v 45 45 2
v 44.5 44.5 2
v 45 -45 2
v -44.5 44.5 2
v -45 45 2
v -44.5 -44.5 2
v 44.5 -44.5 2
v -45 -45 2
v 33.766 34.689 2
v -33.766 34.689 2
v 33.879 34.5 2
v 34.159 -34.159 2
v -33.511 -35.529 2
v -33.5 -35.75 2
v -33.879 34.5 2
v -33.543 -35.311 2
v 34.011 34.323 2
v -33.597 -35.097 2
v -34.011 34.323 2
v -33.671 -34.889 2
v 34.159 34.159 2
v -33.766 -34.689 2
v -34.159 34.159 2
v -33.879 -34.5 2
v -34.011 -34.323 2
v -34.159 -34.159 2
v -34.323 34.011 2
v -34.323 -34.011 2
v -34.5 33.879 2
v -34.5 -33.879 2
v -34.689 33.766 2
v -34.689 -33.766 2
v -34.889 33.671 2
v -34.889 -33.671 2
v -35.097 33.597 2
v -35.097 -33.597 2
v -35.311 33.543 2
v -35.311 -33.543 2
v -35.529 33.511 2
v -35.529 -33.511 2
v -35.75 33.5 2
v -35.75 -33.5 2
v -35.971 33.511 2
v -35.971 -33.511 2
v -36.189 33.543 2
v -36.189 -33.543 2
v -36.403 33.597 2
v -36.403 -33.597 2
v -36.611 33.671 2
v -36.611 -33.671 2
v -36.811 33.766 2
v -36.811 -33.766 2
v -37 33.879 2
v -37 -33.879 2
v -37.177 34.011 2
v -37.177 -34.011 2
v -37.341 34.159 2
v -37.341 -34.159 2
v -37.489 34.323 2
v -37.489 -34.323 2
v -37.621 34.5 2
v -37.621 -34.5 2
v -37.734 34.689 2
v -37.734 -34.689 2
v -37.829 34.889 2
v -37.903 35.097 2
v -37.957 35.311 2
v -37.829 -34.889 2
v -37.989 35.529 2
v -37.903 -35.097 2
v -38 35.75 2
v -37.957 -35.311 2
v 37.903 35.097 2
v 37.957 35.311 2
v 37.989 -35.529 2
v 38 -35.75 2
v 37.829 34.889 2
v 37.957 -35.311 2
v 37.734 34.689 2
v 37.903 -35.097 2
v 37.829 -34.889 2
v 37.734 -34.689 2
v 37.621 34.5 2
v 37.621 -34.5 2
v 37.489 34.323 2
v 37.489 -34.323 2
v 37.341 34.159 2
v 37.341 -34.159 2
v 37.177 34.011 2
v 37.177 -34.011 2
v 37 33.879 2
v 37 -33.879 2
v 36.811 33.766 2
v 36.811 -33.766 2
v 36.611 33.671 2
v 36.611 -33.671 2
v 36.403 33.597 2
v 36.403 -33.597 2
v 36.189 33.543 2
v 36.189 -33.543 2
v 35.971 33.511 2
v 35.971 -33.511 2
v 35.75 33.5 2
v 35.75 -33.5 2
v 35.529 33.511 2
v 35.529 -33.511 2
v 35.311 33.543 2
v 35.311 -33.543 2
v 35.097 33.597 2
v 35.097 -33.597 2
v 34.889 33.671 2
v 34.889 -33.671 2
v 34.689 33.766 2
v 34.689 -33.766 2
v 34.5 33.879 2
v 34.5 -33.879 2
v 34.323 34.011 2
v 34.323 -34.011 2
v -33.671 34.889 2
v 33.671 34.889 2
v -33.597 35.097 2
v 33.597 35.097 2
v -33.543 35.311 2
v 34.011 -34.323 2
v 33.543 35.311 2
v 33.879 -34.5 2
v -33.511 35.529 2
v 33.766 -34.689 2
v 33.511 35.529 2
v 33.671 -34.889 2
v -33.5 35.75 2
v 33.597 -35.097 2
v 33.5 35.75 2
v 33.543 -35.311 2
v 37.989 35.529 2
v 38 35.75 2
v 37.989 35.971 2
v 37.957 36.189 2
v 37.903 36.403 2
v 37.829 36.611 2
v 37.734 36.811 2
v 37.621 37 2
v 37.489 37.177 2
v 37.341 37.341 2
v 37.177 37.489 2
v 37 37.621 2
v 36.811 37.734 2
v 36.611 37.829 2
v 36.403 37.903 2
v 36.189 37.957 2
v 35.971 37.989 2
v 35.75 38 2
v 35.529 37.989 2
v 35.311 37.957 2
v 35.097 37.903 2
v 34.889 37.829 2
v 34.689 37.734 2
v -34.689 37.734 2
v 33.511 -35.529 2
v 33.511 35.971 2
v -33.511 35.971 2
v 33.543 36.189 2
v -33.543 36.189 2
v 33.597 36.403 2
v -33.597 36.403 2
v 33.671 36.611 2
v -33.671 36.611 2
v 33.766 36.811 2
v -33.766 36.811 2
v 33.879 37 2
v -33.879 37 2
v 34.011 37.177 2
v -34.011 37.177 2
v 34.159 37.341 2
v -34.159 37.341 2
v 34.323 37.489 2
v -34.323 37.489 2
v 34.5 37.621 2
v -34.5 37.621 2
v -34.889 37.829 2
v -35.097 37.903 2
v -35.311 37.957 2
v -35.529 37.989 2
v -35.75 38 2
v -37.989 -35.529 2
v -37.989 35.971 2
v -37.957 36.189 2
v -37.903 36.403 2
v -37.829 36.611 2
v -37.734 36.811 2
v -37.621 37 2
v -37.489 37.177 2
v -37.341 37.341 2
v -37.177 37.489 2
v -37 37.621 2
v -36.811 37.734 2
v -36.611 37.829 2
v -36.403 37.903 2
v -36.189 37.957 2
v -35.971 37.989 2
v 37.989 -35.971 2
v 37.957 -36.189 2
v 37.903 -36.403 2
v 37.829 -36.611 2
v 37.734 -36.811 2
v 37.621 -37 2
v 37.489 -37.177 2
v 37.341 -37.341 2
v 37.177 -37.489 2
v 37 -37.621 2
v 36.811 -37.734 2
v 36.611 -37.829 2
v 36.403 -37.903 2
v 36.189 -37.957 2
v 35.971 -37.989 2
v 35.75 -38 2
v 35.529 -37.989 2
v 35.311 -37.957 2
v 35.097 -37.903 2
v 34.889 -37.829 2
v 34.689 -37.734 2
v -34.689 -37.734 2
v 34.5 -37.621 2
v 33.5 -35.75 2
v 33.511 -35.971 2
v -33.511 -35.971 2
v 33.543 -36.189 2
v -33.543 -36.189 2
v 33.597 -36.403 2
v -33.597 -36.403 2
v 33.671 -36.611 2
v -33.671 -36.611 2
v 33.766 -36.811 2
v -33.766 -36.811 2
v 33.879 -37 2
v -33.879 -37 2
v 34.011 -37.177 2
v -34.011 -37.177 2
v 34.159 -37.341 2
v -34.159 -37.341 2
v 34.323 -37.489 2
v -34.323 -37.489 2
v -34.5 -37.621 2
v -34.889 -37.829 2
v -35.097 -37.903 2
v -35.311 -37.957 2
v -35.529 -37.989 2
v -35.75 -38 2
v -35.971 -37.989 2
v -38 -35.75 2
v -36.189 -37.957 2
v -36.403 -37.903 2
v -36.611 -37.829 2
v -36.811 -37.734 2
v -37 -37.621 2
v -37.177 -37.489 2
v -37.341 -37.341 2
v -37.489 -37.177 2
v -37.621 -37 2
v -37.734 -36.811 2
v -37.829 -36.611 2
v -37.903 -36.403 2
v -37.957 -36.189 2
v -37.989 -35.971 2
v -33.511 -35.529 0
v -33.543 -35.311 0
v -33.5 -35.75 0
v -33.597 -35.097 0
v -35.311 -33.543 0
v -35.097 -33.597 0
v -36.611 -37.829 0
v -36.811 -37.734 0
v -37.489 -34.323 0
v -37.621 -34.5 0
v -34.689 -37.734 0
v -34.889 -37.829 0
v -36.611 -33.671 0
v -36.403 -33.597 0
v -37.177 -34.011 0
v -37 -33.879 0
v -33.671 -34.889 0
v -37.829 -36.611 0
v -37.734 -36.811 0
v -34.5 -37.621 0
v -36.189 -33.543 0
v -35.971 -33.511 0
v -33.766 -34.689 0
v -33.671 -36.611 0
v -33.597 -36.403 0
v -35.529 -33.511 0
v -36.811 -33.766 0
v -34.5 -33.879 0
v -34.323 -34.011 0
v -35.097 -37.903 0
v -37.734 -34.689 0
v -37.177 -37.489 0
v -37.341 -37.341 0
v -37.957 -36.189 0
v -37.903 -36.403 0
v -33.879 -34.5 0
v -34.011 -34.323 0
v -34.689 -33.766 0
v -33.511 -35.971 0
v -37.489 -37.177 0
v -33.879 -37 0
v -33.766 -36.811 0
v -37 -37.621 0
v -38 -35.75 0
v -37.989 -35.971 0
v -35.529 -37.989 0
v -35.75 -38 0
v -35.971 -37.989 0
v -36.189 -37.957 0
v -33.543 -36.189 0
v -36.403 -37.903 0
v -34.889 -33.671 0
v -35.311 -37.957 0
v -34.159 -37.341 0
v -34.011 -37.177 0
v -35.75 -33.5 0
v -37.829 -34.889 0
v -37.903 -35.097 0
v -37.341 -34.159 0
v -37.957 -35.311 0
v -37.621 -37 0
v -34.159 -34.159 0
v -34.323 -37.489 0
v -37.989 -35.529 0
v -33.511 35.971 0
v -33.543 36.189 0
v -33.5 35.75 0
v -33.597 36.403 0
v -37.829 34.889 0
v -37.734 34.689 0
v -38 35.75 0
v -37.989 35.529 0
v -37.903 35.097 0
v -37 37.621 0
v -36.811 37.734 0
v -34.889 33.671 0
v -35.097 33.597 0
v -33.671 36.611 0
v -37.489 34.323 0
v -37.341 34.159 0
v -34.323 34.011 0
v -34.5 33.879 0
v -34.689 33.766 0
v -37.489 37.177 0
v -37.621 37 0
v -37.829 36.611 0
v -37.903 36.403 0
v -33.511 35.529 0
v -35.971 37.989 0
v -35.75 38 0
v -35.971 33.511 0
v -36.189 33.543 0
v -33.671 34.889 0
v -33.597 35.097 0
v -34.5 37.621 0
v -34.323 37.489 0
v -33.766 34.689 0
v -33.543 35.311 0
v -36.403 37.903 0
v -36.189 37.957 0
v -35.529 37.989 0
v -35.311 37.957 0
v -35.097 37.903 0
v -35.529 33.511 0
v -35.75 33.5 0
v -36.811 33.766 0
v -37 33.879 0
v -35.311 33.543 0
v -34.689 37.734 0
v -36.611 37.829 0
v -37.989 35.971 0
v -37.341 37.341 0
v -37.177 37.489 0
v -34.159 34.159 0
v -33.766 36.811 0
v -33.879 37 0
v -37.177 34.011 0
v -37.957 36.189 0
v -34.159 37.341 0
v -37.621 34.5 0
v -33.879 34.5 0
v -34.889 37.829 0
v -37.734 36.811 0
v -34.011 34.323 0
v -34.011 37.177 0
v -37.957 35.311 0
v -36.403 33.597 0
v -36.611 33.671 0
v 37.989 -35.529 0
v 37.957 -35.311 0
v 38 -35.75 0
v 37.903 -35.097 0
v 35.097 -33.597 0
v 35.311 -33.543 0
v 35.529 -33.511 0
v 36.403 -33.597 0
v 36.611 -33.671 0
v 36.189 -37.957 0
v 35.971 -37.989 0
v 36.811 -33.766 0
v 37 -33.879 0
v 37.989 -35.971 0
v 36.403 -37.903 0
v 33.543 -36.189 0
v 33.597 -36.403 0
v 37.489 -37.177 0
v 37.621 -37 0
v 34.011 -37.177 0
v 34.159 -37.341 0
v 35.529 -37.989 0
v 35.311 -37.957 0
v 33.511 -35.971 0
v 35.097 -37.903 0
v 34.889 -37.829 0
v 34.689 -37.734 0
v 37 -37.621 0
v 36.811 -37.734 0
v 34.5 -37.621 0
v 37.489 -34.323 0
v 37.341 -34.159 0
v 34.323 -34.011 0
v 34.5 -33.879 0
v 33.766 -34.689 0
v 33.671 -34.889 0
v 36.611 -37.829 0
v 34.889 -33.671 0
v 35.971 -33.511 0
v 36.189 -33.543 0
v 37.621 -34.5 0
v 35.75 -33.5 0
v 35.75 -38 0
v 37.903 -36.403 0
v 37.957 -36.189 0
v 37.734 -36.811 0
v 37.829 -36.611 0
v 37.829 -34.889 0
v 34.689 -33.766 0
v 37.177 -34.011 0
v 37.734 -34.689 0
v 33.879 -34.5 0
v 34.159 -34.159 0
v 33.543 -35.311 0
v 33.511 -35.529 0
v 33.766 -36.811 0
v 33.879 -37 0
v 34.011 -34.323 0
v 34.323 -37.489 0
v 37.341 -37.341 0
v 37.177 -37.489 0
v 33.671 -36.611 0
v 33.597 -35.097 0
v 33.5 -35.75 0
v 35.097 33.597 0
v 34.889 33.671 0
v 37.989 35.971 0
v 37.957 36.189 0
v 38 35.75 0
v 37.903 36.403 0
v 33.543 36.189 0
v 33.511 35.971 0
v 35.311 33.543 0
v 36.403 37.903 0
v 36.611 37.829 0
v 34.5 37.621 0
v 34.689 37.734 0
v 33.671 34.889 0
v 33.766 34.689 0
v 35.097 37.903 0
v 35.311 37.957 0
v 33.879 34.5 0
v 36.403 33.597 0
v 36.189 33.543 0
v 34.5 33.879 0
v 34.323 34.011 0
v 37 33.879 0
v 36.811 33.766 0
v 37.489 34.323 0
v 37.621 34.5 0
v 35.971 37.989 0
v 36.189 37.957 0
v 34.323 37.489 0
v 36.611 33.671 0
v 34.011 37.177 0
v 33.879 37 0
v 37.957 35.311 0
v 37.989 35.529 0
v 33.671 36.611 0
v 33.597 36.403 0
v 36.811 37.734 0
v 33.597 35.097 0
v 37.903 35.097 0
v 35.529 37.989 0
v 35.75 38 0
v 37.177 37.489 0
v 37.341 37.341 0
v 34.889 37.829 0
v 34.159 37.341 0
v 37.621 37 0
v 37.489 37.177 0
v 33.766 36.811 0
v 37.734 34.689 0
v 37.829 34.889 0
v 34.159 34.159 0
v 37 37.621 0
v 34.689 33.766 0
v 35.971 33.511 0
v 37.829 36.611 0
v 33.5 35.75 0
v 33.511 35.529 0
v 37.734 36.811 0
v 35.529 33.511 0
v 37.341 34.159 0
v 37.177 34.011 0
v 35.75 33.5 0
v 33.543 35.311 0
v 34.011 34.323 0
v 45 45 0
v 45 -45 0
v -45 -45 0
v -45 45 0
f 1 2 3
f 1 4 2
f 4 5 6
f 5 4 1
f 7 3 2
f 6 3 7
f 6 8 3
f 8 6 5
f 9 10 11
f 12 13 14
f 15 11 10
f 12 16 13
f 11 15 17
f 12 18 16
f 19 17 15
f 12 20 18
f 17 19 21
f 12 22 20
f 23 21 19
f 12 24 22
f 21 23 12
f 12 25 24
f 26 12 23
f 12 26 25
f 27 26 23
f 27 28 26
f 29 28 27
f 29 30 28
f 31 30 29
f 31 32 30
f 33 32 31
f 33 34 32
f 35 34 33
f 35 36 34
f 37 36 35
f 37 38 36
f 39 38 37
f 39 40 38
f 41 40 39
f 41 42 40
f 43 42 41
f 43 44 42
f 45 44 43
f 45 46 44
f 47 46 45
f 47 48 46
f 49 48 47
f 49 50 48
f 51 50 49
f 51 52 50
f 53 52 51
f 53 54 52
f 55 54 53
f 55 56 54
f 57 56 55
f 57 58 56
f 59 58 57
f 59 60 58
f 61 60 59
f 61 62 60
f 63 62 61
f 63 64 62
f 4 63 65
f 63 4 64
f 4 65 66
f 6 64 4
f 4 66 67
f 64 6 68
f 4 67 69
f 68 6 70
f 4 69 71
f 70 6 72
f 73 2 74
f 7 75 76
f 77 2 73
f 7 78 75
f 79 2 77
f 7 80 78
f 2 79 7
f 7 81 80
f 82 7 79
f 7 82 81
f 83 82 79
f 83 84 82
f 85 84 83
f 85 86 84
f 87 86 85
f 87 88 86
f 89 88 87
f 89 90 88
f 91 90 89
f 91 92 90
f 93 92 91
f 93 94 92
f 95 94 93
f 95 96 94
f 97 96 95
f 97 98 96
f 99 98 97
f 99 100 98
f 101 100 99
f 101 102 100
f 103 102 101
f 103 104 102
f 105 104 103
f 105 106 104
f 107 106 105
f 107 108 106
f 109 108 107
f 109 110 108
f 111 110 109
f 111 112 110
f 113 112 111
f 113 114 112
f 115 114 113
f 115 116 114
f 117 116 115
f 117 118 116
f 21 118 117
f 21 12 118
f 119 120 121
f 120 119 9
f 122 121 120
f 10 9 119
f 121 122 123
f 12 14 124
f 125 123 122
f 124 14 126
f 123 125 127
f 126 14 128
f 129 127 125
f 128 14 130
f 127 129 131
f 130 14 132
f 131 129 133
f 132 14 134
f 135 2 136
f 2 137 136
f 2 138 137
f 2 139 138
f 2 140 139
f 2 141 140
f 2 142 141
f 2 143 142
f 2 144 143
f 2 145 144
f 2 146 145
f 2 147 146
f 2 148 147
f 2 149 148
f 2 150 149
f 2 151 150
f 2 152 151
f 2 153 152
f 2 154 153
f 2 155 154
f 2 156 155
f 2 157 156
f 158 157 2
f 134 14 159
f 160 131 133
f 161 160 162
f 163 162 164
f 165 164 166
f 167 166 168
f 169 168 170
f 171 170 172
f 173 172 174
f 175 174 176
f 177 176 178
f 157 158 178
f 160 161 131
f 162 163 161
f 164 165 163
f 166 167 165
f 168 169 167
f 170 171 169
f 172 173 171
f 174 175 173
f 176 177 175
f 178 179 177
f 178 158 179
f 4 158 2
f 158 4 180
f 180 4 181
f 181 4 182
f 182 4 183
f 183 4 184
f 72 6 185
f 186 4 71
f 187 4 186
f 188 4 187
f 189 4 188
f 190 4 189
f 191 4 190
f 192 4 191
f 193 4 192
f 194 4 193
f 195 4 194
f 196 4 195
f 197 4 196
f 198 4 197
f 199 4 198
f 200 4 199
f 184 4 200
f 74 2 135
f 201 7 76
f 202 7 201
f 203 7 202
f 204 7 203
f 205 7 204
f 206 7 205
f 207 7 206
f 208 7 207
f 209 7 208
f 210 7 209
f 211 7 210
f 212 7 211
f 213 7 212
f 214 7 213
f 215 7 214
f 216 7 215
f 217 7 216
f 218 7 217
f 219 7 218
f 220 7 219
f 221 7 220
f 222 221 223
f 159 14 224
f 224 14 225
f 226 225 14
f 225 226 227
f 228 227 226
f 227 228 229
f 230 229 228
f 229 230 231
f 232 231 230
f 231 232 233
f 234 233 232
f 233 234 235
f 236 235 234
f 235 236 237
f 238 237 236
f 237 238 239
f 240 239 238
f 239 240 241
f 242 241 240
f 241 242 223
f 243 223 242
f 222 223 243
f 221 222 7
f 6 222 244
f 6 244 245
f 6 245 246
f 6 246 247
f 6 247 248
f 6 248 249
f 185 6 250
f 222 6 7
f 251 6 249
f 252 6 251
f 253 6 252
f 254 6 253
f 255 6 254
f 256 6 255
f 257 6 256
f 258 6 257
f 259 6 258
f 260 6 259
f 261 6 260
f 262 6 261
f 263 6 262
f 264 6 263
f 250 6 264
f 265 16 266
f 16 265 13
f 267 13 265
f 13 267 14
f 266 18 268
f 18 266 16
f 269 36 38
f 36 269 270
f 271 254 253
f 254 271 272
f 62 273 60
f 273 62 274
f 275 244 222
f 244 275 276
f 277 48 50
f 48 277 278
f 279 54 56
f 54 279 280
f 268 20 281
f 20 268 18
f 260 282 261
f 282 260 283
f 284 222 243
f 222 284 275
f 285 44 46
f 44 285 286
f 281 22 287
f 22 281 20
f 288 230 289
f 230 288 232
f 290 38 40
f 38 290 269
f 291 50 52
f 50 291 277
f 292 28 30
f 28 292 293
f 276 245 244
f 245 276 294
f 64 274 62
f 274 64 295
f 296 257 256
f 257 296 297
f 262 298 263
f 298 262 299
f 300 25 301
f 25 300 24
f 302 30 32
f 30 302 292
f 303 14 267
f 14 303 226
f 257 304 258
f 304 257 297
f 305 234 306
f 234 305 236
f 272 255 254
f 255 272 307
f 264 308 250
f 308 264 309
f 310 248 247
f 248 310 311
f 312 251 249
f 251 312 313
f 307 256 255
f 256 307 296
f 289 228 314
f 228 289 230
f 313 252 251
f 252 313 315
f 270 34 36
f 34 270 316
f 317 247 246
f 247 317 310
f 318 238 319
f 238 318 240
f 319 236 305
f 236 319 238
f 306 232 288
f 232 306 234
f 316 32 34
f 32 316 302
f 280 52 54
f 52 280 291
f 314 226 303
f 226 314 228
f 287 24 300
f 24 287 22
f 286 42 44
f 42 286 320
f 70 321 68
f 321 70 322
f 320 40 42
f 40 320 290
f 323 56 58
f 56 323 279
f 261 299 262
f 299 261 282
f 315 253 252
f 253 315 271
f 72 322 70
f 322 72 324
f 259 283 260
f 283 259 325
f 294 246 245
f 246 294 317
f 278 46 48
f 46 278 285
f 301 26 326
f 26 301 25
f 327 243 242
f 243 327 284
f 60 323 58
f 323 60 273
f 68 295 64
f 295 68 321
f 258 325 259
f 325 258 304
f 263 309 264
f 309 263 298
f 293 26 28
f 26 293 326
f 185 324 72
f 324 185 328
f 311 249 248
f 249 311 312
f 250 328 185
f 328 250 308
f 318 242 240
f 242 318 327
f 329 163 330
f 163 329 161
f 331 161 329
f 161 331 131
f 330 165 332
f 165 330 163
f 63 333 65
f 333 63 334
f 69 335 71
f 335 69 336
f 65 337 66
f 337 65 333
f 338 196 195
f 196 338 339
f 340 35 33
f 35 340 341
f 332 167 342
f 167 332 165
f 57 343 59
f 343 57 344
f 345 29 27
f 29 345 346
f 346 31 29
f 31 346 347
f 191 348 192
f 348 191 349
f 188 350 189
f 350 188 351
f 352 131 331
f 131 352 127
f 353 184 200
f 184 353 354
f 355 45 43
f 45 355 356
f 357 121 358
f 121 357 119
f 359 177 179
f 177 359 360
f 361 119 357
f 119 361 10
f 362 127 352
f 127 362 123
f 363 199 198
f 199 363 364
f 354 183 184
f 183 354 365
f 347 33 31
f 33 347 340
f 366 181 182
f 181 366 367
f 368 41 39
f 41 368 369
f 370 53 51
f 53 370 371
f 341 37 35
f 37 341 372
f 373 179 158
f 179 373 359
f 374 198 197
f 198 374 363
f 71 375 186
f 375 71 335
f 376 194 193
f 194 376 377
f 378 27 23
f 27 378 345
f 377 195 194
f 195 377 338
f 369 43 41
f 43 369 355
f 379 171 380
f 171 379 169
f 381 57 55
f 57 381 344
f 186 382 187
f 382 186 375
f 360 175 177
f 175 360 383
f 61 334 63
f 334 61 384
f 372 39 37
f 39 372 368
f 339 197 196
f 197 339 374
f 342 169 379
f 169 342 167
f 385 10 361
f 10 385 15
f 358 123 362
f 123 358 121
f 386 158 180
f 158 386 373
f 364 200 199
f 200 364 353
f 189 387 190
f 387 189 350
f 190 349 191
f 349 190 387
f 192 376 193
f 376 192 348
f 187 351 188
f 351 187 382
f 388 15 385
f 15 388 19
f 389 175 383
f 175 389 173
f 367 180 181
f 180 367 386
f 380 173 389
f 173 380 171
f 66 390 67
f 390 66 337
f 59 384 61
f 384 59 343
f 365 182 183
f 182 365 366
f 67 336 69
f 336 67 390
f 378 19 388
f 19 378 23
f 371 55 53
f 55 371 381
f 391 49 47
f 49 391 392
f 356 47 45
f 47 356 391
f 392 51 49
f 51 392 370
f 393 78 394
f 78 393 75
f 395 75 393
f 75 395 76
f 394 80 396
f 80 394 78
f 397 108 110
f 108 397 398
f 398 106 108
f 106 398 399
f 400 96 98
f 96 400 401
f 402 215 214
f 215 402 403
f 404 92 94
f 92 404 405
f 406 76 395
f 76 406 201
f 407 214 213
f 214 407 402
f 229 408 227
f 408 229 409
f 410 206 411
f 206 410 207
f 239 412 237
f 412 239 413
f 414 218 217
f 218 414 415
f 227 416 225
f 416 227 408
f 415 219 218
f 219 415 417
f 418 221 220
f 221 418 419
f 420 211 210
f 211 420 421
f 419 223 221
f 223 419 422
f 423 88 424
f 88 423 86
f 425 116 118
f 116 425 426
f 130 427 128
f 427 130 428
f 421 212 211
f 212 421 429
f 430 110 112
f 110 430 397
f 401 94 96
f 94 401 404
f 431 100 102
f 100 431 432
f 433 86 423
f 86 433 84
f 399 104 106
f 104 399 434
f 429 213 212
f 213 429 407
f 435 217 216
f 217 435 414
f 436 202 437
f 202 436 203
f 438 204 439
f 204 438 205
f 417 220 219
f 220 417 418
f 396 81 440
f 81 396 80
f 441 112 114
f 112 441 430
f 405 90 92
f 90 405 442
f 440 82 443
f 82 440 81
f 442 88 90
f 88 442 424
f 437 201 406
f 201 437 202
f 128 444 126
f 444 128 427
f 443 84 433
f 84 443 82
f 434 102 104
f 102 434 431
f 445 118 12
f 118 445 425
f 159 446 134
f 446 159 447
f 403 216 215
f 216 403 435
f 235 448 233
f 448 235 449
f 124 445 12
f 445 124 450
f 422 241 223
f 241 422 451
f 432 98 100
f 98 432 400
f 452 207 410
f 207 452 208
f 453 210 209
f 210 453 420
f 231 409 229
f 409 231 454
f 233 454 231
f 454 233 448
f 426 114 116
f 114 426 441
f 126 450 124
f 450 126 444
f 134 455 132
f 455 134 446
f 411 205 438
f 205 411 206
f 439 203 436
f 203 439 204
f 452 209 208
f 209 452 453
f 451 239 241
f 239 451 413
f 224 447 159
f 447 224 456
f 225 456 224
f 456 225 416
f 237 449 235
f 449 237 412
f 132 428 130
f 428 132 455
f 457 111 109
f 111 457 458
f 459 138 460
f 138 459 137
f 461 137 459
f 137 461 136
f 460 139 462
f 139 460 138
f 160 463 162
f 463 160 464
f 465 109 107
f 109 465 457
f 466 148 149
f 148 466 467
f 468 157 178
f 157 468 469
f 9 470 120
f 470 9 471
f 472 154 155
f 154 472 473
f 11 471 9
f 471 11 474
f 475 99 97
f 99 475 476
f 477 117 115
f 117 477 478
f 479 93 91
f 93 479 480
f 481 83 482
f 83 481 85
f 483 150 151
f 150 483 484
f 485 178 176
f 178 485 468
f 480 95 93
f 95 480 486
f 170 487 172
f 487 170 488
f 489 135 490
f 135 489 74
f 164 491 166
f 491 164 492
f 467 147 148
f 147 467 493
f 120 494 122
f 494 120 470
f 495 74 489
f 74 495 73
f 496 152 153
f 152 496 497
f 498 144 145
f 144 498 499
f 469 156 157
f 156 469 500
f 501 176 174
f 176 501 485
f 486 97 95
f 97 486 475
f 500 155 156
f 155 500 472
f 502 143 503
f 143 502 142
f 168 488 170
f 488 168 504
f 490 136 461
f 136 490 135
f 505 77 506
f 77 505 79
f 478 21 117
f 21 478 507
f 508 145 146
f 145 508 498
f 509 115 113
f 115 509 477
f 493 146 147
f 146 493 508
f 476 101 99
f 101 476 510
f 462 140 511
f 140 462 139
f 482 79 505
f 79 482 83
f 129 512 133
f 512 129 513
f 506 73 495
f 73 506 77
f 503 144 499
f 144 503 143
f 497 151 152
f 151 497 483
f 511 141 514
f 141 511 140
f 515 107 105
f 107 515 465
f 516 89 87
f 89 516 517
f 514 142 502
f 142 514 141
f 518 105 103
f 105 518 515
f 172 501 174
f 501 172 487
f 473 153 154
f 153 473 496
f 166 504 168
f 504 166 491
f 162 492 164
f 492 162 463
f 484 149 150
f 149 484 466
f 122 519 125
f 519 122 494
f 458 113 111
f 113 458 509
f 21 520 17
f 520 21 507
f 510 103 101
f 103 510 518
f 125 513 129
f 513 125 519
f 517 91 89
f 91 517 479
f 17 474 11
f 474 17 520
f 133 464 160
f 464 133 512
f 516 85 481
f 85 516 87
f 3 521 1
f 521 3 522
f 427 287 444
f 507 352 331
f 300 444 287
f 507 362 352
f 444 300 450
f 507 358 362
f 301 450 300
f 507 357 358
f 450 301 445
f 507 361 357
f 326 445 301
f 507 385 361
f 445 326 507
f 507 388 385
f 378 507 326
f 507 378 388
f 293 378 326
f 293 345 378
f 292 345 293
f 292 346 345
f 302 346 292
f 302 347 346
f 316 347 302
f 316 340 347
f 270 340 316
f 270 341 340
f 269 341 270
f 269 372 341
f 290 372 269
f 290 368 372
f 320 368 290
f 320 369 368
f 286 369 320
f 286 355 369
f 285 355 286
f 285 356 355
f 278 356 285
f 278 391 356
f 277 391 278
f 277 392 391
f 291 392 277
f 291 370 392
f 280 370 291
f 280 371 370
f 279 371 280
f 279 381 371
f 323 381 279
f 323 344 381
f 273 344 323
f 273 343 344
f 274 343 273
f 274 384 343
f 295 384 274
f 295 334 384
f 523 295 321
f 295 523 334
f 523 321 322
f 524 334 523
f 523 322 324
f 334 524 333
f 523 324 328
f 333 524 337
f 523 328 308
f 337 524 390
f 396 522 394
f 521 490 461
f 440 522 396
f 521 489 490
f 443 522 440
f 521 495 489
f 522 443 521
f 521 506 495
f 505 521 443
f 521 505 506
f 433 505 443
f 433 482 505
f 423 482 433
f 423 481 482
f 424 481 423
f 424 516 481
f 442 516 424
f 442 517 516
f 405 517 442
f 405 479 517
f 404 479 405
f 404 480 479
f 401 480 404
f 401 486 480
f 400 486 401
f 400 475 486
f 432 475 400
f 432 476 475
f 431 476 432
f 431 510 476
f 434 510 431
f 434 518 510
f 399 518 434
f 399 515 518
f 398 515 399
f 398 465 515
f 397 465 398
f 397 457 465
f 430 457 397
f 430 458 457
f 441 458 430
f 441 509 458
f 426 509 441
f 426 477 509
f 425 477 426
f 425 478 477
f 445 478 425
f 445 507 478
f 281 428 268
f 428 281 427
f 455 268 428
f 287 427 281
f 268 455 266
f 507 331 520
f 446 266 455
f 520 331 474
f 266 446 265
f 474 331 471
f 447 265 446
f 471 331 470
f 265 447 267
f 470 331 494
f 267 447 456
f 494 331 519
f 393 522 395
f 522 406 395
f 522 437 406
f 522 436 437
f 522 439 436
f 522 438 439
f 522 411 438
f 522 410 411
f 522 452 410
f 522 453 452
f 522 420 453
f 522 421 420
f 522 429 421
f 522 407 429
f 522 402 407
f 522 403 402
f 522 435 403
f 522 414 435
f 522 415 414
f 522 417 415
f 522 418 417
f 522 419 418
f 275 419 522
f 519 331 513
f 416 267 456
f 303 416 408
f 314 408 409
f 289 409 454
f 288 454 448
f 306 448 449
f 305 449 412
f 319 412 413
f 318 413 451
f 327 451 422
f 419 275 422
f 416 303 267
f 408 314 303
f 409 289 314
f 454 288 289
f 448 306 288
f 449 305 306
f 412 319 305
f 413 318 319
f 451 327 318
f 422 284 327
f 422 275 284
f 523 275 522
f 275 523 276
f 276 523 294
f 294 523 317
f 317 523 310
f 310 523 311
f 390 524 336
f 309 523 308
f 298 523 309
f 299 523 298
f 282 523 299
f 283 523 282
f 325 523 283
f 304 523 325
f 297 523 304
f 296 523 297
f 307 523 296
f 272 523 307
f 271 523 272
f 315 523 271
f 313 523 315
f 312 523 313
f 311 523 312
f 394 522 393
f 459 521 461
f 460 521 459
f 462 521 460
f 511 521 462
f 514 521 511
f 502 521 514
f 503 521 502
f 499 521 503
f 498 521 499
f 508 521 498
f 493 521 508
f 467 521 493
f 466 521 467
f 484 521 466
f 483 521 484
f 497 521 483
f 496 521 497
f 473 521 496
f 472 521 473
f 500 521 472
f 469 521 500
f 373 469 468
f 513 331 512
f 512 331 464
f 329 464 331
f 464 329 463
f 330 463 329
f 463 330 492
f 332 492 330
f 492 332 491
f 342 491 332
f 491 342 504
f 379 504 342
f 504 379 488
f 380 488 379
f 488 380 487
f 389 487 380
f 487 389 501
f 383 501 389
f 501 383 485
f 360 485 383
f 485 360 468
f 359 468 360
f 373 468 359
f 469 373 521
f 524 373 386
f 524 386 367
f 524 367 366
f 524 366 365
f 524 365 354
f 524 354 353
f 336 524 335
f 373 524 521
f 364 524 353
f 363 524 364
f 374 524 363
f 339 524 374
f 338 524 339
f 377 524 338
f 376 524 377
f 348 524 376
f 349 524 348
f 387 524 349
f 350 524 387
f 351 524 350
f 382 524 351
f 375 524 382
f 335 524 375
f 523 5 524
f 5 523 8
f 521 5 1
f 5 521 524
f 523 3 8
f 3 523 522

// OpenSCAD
// Magnetic stirrer housing - upside-down open box over PC fan
// Print orientation: top plate on bed (z = 0), walls rise to open top (z = 40)

// ---------- Parameters ----------
plate_t      = 2;     // top plate thickness
wall_t       = 2.5;   // wall thickness
box_h        = 40;    // total height (open top at z = 40)
outer_x      = 90;    // outer size in X
outer_y      = 90;    // outer size in Y
screw_d      = 4.5;   // M4 screw hole diameter
screw_n      = 4;     // number of screw holes
screw_pitch  = 71.5;  // square pattern side length (hole centre to hole centre)
notch_w      = 12;    // cable notch width
notch_d      = 8;     // cable notch depth from open edge
eps          = 0.5;   // cutter overshoot past faces

$fn = 64;

// ---------- Model ----------
difference() {
    // Closed top plate
    translate([-outer_x/2, -outer_y/2, 0])
        cube([outer_x, outer_y, plate_t]);

    // Four walls, open top, with overshoot above the open edge
    for (a = [0, 90, 180, 270])
        rotate([0, 0, a])
            translate([outer_x/2 - eps, -outer_y/2, plate_t])
                cube([eps, outer_y, box_h + eps]);

    // Screw holes through the top plate, centred on the plate
    for (i = [0 : screw_n - 1]) {
        for (j = [0 : screw_n - 1]) {
            x = (i - (screw_n - 1)/2) * screw_pitch;
            y = (j - (screw_n - 1)/2) * screw_pitch;
            translate([x, y, -eps])
                cylinder(d = screw_d, h = plate_t + 2*eps);
        }
    }

    // Cable notch in one wall: 12 mm wide, centred along the wall,
    // reaching 8 mm down from the open edge (z = 32 to z = 40)
    translate([outer_x/2 - notch_w/2, 0, plate_t + notch_d])
        cube([notch_w, outer_y, notch_w]);
}
